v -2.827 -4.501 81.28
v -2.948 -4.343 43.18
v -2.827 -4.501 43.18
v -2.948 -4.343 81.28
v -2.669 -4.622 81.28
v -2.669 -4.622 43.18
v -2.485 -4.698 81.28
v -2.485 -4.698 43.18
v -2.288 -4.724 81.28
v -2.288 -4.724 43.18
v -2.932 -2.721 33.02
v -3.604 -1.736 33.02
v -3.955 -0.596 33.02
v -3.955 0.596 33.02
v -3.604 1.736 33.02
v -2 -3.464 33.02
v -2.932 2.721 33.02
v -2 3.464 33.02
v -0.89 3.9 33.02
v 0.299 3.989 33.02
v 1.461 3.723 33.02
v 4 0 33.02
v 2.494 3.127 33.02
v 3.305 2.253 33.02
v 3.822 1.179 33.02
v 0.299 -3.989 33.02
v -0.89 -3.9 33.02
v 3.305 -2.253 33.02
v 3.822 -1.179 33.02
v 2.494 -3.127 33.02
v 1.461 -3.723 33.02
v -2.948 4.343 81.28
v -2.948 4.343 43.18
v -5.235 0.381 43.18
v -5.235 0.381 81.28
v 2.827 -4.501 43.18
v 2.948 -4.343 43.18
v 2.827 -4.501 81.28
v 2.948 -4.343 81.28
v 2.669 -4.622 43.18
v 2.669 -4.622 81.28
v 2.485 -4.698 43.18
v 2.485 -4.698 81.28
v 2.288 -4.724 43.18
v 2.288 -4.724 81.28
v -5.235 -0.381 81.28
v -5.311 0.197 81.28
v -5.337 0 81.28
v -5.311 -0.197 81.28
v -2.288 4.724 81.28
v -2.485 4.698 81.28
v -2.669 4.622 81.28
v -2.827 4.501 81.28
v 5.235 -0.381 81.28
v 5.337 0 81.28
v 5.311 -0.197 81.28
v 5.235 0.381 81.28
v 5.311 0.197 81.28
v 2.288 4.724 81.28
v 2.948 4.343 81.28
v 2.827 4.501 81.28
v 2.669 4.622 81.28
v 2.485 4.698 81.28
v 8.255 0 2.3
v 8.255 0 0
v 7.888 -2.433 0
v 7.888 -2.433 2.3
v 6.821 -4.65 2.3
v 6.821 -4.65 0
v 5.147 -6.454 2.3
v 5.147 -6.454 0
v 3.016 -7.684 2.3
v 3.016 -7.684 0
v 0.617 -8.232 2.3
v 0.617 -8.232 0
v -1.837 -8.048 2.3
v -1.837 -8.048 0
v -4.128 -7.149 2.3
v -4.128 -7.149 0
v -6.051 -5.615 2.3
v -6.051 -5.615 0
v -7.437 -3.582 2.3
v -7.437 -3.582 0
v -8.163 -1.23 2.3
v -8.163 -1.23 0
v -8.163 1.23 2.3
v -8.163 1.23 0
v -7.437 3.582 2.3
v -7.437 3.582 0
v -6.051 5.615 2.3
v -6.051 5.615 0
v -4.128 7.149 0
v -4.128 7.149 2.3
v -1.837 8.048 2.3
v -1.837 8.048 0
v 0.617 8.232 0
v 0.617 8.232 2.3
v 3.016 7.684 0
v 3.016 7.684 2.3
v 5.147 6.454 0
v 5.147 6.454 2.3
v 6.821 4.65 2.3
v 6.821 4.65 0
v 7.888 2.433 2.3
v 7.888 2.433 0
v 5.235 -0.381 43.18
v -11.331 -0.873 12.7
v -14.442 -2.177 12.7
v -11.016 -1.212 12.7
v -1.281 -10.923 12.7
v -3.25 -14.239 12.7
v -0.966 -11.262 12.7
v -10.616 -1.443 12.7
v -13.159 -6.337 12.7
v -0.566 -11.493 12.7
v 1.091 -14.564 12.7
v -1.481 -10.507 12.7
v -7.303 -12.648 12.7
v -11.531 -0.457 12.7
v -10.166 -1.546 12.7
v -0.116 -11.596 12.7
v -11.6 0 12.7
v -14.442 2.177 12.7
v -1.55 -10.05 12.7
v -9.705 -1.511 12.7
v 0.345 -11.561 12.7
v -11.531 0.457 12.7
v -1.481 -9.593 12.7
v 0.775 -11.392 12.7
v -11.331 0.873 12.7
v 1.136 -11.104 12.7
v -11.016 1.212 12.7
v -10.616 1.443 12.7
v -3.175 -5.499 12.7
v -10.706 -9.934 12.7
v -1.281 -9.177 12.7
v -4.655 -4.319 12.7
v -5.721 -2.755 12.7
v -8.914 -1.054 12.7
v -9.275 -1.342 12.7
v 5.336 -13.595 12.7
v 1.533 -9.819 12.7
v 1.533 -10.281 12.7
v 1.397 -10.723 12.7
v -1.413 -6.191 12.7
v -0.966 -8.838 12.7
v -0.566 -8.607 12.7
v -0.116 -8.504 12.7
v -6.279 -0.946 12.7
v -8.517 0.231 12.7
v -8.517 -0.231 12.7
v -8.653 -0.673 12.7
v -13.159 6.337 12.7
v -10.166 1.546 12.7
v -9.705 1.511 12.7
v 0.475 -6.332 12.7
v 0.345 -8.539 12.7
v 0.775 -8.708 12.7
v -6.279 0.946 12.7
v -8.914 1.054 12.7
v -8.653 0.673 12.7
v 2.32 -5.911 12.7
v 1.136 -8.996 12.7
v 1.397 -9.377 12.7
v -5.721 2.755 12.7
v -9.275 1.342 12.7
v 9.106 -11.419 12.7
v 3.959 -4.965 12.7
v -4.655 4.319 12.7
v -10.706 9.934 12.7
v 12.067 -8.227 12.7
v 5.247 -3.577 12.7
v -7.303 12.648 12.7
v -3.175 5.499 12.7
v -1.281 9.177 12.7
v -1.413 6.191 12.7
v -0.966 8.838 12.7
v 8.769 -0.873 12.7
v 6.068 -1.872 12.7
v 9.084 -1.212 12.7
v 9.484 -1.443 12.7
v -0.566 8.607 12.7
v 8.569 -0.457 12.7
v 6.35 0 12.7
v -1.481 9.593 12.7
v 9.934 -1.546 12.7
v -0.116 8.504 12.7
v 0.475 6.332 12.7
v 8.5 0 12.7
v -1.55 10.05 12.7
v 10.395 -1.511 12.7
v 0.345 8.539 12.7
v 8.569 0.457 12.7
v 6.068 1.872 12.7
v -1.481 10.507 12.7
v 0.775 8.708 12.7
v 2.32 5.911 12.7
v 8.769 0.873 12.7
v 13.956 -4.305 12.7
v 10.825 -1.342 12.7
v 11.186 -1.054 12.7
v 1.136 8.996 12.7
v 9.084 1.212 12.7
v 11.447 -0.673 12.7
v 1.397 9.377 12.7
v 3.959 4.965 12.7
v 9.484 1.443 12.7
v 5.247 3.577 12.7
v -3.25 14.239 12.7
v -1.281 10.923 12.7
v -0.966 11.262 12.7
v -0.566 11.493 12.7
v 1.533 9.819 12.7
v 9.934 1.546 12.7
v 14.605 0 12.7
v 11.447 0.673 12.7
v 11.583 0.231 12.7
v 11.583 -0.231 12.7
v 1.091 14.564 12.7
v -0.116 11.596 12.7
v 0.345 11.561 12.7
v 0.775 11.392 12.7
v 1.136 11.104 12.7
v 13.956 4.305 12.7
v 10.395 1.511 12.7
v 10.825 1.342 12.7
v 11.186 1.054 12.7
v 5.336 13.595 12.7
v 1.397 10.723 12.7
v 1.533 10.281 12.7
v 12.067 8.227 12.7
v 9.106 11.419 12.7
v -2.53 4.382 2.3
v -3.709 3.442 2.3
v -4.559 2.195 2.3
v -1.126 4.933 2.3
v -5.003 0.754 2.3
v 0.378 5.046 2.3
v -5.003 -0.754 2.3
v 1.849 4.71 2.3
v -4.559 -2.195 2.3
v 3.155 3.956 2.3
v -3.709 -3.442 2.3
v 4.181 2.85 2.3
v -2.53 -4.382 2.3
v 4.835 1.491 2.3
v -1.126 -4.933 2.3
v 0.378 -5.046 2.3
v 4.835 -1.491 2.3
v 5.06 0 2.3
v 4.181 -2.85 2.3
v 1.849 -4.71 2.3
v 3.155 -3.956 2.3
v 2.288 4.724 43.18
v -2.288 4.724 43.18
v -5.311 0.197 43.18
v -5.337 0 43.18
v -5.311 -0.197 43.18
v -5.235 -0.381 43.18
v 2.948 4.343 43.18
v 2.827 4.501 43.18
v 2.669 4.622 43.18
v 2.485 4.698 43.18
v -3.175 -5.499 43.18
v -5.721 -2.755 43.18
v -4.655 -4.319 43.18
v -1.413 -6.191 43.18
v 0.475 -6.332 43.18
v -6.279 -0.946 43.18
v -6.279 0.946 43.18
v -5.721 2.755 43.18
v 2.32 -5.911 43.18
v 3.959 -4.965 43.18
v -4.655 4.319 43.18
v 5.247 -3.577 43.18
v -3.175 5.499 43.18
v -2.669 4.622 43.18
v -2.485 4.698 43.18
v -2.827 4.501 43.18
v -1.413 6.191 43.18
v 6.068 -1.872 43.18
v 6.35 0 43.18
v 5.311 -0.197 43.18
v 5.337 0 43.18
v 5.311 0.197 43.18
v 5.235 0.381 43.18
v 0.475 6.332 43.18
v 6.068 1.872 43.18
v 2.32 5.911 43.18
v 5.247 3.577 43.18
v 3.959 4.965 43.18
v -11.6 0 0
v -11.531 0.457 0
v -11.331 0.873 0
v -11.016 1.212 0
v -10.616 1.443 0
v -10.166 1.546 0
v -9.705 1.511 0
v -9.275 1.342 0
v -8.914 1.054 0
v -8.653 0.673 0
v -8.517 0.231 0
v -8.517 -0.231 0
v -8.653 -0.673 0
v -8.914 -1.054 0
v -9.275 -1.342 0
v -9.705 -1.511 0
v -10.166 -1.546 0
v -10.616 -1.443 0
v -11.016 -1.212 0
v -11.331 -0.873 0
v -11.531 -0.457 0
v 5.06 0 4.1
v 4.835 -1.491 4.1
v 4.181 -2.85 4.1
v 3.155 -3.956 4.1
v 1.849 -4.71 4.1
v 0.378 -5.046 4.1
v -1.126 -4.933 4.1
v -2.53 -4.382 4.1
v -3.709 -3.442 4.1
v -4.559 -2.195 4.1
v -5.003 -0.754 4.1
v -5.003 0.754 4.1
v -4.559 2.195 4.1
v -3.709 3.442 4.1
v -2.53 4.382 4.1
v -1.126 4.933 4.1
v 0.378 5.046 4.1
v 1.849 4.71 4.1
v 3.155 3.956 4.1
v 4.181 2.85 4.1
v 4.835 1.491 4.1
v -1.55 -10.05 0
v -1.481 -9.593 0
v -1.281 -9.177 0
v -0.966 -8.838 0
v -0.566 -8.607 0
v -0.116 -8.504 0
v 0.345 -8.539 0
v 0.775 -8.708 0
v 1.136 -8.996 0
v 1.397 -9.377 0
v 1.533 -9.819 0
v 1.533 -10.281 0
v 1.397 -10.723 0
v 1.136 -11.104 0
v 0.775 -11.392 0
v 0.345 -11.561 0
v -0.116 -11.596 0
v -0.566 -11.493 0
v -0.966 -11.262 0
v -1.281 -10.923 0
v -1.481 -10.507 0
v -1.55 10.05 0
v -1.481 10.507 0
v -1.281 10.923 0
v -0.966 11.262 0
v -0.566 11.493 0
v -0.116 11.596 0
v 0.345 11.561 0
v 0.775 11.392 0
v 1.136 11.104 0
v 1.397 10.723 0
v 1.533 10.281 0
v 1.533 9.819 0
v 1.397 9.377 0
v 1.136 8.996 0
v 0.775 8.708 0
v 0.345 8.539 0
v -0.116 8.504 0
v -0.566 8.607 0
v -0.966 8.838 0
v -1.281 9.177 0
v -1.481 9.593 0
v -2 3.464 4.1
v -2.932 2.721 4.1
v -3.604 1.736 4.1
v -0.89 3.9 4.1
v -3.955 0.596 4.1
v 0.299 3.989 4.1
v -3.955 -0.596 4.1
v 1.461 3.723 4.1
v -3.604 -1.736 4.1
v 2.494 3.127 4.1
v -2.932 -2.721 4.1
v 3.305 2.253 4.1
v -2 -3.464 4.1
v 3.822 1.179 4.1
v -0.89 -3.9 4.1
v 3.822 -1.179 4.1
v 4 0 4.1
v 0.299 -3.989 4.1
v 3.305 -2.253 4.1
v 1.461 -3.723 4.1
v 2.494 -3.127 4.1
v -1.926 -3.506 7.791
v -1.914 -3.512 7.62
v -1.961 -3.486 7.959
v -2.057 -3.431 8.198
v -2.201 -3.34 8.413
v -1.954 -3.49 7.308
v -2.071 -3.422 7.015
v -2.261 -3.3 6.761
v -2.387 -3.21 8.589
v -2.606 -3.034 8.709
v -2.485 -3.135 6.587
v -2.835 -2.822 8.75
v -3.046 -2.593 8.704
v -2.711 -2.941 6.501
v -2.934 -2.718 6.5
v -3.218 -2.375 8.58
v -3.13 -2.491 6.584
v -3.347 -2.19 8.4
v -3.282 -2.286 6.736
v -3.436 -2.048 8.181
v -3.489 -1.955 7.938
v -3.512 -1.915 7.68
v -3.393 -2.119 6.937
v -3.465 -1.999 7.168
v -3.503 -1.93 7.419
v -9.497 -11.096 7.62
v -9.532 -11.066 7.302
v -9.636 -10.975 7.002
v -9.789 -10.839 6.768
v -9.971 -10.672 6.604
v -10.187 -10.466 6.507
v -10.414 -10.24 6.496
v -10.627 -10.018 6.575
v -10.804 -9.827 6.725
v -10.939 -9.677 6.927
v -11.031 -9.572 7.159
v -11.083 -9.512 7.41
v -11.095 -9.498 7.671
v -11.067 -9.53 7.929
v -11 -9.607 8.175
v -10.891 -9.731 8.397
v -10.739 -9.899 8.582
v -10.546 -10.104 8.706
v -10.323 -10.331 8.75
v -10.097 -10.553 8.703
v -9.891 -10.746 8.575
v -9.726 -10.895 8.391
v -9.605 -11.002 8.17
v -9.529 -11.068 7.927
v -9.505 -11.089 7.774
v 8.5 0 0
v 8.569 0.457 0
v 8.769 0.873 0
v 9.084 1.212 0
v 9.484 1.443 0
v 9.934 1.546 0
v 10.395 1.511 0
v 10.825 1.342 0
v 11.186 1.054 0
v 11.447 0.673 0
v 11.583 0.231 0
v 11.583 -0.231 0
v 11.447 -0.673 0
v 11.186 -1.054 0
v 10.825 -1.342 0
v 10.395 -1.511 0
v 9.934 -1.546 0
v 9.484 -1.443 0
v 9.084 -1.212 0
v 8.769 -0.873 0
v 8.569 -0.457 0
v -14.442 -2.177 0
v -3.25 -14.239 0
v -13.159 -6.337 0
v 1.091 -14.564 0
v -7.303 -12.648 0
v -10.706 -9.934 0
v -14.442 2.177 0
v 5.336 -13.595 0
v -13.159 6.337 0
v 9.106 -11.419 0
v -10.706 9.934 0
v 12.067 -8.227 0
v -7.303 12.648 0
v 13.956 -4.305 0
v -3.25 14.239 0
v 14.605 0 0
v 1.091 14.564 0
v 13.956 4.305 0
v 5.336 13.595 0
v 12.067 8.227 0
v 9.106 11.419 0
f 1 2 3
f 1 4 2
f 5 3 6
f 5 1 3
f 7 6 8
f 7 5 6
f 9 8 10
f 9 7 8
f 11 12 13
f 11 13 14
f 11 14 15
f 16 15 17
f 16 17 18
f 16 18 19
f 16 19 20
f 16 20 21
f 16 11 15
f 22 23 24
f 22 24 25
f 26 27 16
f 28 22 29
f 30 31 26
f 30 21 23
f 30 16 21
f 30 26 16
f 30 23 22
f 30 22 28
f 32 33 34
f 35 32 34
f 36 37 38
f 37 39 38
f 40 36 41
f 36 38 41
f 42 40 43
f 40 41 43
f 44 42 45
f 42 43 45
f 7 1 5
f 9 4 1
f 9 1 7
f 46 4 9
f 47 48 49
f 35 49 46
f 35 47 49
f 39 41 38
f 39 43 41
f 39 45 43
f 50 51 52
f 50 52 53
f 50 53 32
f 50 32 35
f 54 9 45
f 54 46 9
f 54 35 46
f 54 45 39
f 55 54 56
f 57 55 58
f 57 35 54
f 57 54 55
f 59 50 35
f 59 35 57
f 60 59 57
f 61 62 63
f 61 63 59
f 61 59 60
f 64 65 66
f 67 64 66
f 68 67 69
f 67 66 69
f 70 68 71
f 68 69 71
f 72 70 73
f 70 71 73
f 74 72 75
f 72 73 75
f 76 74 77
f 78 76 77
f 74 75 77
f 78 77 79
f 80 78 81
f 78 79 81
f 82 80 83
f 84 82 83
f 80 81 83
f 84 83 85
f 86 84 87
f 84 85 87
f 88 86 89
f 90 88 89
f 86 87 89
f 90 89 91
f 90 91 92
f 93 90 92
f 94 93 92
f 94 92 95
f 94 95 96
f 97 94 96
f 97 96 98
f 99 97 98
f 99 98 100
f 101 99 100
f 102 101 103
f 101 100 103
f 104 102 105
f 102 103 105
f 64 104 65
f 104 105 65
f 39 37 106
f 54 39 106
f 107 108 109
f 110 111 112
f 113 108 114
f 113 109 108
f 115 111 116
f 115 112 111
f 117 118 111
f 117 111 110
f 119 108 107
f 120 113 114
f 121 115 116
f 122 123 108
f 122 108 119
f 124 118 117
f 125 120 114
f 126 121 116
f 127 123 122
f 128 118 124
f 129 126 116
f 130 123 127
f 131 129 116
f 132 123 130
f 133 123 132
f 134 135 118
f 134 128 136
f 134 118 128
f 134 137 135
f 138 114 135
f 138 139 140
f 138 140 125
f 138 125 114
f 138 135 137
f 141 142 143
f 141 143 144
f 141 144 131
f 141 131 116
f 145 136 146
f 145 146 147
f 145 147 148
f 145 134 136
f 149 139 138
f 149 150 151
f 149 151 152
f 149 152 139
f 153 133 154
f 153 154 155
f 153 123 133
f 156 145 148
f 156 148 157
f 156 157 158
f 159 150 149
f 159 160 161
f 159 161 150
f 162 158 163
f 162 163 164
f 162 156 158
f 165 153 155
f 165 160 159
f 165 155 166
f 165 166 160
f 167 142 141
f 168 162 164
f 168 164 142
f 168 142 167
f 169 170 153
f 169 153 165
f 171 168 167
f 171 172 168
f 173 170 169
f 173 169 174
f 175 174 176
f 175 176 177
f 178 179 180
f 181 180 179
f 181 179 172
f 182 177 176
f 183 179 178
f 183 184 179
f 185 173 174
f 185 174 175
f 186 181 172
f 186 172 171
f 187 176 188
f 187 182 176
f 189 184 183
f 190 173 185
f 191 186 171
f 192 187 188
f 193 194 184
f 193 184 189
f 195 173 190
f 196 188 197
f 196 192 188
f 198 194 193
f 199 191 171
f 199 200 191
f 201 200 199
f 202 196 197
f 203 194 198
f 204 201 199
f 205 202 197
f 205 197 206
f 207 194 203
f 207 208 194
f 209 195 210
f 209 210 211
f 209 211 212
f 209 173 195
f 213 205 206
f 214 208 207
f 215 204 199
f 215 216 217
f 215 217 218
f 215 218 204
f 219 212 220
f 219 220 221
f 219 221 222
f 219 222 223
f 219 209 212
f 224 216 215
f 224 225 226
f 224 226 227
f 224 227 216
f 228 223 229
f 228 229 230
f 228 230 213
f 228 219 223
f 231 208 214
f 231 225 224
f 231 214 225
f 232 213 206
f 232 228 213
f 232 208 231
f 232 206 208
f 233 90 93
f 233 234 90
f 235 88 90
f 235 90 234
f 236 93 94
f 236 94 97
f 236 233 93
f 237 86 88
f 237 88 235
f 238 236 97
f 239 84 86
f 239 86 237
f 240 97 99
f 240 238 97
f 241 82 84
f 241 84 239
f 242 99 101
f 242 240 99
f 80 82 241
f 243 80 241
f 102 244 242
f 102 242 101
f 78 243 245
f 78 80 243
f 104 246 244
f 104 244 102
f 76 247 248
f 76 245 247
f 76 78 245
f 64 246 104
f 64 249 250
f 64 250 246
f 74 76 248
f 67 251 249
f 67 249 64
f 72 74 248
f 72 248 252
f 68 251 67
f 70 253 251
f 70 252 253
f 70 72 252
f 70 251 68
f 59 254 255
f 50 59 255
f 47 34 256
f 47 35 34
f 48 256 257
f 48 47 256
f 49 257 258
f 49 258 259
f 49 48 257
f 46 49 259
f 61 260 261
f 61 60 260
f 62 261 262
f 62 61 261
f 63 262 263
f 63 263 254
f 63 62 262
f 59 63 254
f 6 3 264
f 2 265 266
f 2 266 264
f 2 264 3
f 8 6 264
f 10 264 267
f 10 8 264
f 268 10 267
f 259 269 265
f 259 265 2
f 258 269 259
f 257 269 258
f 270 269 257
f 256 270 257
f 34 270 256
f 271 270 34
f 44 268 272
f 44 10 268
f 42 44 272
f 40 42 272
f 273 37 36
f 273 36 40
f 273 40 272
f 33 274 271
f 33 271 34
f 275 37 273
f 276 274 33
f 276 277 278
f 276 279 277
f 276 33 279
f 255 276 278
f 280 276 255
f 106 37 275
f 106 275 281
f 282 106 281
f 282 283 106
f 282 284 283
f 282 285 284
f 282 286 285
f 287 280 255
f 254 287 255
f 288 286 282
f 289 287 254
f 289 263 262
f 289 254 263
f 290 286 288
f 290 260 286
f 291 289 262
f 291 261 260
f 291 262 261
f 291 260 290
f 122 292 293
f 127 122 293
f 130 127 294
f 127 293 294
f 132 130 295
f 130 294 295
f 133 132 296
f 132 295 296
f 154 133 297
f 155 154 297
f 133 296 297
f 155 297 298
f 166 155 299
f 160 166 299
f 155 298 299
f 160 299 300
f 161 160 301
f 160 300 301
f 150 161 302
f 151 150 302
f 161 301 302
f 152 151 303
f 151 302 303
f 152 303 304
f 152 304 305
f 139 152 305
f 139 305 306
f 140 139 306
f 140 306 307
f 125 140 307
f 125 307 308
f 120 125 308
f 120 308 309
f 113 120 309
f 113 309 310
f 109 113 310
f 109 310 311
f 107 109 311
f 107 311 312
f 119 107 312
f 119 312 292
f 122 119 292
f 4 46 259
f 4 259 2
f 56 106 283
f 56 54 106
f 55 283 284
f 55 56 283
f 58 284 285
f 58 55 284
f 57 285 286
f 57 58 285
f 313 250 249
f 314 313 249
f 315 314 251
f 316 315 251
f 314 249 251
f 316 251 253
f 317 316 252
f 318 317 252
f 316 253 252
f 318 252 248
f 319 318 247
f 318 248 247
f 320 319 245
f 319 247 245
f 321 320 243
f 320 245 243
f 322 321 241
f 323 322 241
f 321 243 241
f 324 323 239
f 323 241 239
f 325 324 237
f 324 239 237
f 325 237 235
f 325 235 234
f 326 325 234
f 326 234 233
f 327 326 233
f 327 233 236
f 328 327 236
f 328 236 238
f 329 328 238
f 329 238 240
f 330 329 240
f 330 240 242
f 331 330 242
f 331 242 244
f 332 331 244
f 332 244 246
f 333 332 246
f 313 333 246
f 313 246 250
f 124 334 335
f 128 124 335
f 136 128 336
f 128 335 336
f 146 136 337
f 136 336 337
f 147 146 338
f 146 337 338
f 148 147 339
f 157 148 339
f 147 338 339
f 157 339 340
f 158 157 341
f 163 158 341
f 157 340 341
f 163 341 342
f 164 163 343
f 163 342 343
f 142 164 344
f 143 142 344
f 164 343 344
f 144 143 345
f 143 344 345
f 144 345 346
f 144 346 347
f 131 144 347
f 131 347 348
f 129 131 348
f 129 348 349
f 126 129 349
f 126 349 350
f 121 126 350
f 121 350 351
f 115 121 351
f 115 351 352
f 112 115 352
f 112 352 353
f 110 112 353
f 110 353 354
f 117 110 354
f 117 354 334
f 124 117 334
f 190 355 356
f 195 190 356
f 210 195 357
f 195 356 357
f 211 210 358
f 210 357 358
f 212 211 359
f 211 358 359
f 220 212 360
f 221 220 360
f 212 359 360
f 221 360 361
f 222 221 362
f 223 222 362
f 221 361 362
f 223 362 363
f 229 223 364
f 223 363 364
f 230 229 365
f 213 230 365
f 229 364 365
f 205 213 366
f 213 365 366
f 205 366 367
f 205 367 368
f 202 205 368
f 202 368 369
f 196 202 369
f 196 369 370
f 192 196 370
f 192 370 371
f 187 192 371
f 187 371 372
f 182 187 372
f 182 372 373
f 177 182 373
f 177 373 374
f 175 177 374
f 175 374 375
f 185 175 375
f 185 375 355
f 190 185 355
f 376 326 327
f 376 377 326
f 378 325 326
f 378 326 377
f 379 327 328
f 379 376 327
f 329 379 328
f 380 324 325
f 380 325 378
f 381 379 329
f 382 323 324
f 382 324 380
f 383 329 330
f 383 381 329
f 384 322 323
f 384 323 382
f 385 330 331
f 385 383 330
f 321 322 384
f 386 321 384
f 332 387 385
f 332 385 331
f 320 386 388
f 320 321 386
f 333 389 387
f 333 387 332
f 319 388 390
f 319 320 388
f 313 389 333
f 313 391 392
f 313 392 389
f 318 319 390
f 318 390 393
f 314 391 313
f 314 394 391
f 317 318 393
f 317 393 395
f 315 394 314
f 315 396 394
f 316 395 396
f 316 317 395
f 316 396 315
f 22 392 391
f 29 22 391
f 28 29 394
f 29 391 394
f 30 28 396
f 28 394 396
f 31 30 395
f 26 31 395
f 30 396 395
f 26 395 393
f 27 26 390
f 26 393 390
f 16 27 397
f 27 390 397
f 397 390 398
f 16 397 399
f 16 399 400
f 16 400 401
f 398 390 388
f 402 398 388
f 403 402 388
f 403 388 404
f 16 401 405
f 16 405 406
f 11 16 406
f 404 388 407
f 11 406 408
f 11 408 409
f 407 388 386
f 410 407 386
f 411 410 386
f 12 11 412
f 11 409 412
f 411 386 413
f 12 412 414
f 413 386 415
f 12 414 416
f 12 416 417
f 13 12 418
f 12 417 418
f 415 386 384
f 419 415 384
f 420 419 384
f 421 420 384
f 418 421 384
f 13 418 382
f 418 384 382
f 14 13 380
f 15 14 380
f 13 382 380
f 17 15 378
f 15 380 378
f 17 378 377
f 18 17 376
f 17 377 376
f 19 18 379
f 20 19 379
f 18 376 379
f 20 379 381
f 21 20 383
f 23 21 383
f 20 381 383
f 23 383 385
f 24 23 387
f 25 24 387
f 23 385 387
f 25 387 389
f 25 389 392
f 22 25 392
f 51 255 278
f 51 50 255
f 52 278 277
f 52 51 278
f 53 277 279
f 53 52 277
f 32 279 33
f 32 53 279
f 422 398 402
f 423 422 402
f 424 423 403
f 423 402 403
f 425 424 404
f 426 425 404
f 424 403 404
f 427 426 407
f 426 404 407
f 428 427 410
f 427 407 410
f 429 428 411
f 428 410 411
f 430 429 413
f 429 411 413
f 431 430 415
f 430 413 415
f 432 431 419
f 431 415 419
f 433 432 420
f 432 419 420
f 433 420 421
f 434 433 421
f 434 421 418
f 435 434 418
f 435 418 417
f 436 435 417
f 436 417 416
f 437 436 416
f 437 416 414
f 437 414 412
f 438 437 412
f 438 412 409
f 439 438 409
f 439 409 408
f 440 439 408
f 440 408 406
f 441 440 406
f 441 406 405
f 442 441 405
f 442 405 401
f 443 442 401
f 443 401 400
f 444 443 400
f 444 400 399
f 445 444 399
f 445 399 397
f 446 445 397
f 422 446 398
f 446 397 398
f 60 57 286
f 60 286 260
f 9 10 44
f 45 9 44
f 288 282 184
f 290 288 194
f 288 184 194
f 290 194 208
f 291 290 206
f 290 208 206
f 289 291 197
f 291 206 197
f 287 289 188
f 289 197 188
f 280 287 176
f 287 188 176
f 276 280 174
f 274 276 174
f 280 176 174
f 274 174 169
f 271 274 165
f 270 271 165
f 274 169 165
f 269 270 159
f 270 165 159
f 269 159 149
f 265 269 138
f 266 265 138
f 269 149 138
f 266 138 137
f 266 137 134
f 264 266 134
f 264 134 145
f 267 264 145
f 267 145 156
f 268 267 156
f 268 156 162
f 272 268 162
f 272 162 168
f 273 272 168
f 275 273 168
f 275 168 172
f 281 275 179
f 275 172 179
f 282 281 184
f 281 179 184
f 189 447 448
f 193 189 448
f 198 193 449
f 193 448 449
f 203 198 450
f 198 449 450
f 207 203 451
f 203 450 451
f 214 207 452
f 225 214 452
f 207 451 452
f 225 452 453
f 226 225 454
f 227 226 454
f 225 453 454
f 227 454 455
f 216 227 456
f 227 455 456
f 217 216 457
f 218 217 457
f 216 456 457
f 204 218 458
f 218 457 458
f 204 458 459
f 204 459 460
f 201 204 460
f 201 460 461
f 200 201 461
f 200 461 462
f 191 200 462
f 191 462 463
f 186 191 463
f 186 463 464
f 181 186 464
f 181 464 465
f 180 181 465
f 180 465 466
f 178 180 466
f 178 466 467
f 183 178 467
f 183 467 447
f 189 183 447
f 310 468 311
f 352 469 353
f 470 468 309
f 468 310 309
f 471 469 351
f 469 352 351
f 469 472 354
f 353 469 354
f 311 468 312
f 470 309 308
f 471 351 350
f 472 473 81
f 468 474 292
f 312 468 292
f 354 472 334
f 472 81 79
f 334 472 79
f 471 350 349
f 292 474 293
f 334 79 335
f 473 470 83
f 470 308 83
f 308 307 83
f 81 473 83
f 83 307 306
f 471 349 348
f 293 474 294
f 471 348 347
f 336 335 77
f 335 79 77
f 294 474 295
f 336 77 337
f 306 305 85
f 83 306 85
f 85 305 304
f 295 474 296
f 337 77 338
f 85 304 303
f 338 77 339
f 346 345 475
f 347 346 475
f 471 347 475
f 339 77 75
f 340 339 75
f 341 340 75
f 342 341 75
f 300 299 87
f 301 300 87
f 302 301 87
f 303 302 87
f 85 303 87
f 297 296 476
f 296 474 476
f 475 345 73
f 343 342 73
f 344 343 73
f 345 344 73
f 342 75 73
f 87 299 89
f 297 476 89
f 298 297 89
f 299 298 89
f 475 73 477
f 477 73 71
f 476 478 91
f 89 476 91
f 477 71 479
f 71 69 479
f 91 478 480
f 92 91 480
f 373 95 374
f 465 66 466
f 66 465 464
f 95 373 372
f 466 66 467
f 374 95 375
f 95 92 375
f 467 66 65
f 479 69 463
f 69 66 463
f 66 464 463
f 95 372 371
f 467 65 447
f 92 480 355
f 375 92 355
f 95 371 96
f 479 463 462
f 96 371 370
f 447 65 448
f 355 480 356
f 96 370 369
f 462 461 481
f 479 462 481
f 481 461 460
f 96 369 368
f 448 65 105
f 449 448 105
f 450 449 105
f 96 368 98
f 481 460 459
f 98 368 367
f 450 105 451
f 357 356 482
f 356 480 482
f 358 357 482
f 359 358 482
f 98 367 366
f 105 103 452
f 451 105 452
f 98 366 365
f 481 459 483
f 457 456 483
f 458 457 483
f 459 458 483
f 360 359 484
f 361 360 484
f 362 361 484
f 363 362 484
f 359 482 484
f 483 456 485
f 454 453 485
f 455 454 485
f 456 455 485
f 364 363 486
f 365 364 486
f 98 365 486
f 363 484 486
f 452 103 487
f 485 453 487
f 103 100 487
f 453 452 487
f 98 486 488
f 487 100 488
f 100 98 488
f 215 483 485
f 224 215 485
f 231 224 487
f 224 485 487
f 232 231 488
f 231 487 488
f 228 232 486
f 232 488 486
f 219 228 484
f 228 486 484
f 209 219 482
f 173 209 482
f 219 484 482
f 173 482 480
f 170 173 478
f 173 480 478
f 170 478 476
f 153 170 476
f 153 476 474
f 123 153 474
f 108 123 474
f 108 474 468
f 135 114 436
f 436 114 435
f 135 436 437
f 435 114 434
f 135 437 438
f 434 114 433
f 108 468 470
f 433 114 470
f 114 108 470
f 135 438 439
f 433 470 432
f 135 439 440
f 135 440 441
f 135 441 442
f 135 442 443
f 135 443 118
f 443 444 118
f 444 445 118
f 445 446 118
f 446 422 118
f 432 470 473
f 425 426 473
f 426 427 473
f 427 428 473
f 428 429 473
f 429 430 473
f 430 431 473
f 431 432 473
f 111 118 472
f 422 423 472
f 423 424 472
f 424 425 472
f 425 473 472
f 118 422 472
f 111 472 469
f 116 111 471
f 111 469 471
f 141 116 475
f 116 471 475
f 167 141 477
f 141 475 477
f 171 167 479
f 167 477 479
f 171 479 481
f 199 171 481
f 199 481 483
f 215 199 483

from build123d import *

# Parameters (mm, degrees)
F0_R      = 14.605
F1_DEPTH  = 12.7
F2_R      = 6.35
F3_DEPTH  = 30.48
F5_DEPTH  = 38.1
F6_R      = 8.255
F7_DEPTH  = 2.3
F8_R      = 5.06
F9_DEPTH  = 4.1
F11_D     = 3.1
F12_R     = 0.762
F13_R     = 4
F14_DEPTH = 33.02
F20_D     = 2.2606
F20_DEPTH = 12.7
F20_START = 0.0438035
F20_TIP   = 0.6791527577


with BuildPart() as f1:
    # F0 (on Top) → F1 (new body)
    with BuildSketch(Plane.XY):
        Circle(F0_R)
    extrude(amount=F1_DEPTH)

    # F2 (on face) → F3 (join)
    with BuildSketch(Plane.XY.offset(12.7)):
        Circle(F2_R)
    extrude(amount=F3_DEPTH)

    # F4 (on face) → F5 (join)
    with BuildSketch(Plane.XY.offset(43.18)):
        Polygon((2.7276336118, -4.7244), (5.4552672235, 0), (2.7276336118, 4.7244), (-2.7276336118, 4.7244), (-5.4552672235, 0), (-2.7276336118, -4.7244), align=None)
    extrude(amount=F5_DEPTH)

    # F6 (on face) → F7 (cut)
    with BuildSketch(Plane(origin=(0, 0, 0), x_dir=(1, 0, 0), z_dir=(0, 0, -1))):
        Circle(F6_R)
    extrude(amount=-F7_DEPTH, mode=Mode.SUBTRACT)

    # F8 (on face) → F9 (cut)
    with BuildSketch(Plane(origin=(0, 0, 0), x_dir=(1, 0, 0), z_dir=(0, 0, -1))):
        Circle(F8_R)
    extrude(amount=-F9_DEPTH, mode=Mode.SUBTRACT)

    # F11 (through all)
    with Locations(Plane.XY.offset(12.7)):
        with Locations((0, -10.05), (-10.05, 0), (0, 10.05), (10.05, 0)):
            Hole(F11_D / 2)

    # F12
    f12_edges = [f1.edges().sort_by_distance(p)[0] for p in [
        (-2.727634, -4.7244, 62.23),
        (2.727634, -4.7244, 62.23),
        (5.455267, 0, 62.23),
        (2.727634, 4.7244, 62.23),
        (-2.727634, 4.7244, 62.23),
        (-5.455267, 0, 62.23),
    ]]
    fillet(f12_edges, radius=F12_R)

    # F13 (on face) → F14 (cut)
    with BuildSketch(Plane(origin=(0, 0, 0), x_dir=(1, 0, 0), z_dir=(0, 0, -1))):
        Circle(F13_R)
    extrude(amount=-F14_DEPTH, mode=Mode.SUBTRACT)

    # F20
    # its depths count from where the whole tool has entered the part; down to there all is cleared
    with Locations(Plane(origin=(-10.3272945392, -10.3272945392, 0), x_dir=(-0.7071067812, 0.7071067812, 0), z_dir=(-0.7071067812, -0.7071067812, 0)).offset(-F20_START)):
        with Locations((0, -7.62)):
            Hole(F20_D / 2, depth=F20_DEPTH)
            with Locations((0, 0, -(F20_DEPTH + F20_TIP / 2))):  # 118° drill point
                Cone(0, F20_D / 2, F20_TIP, mode=Mode.SUBTRACT)


solid = f1.part
